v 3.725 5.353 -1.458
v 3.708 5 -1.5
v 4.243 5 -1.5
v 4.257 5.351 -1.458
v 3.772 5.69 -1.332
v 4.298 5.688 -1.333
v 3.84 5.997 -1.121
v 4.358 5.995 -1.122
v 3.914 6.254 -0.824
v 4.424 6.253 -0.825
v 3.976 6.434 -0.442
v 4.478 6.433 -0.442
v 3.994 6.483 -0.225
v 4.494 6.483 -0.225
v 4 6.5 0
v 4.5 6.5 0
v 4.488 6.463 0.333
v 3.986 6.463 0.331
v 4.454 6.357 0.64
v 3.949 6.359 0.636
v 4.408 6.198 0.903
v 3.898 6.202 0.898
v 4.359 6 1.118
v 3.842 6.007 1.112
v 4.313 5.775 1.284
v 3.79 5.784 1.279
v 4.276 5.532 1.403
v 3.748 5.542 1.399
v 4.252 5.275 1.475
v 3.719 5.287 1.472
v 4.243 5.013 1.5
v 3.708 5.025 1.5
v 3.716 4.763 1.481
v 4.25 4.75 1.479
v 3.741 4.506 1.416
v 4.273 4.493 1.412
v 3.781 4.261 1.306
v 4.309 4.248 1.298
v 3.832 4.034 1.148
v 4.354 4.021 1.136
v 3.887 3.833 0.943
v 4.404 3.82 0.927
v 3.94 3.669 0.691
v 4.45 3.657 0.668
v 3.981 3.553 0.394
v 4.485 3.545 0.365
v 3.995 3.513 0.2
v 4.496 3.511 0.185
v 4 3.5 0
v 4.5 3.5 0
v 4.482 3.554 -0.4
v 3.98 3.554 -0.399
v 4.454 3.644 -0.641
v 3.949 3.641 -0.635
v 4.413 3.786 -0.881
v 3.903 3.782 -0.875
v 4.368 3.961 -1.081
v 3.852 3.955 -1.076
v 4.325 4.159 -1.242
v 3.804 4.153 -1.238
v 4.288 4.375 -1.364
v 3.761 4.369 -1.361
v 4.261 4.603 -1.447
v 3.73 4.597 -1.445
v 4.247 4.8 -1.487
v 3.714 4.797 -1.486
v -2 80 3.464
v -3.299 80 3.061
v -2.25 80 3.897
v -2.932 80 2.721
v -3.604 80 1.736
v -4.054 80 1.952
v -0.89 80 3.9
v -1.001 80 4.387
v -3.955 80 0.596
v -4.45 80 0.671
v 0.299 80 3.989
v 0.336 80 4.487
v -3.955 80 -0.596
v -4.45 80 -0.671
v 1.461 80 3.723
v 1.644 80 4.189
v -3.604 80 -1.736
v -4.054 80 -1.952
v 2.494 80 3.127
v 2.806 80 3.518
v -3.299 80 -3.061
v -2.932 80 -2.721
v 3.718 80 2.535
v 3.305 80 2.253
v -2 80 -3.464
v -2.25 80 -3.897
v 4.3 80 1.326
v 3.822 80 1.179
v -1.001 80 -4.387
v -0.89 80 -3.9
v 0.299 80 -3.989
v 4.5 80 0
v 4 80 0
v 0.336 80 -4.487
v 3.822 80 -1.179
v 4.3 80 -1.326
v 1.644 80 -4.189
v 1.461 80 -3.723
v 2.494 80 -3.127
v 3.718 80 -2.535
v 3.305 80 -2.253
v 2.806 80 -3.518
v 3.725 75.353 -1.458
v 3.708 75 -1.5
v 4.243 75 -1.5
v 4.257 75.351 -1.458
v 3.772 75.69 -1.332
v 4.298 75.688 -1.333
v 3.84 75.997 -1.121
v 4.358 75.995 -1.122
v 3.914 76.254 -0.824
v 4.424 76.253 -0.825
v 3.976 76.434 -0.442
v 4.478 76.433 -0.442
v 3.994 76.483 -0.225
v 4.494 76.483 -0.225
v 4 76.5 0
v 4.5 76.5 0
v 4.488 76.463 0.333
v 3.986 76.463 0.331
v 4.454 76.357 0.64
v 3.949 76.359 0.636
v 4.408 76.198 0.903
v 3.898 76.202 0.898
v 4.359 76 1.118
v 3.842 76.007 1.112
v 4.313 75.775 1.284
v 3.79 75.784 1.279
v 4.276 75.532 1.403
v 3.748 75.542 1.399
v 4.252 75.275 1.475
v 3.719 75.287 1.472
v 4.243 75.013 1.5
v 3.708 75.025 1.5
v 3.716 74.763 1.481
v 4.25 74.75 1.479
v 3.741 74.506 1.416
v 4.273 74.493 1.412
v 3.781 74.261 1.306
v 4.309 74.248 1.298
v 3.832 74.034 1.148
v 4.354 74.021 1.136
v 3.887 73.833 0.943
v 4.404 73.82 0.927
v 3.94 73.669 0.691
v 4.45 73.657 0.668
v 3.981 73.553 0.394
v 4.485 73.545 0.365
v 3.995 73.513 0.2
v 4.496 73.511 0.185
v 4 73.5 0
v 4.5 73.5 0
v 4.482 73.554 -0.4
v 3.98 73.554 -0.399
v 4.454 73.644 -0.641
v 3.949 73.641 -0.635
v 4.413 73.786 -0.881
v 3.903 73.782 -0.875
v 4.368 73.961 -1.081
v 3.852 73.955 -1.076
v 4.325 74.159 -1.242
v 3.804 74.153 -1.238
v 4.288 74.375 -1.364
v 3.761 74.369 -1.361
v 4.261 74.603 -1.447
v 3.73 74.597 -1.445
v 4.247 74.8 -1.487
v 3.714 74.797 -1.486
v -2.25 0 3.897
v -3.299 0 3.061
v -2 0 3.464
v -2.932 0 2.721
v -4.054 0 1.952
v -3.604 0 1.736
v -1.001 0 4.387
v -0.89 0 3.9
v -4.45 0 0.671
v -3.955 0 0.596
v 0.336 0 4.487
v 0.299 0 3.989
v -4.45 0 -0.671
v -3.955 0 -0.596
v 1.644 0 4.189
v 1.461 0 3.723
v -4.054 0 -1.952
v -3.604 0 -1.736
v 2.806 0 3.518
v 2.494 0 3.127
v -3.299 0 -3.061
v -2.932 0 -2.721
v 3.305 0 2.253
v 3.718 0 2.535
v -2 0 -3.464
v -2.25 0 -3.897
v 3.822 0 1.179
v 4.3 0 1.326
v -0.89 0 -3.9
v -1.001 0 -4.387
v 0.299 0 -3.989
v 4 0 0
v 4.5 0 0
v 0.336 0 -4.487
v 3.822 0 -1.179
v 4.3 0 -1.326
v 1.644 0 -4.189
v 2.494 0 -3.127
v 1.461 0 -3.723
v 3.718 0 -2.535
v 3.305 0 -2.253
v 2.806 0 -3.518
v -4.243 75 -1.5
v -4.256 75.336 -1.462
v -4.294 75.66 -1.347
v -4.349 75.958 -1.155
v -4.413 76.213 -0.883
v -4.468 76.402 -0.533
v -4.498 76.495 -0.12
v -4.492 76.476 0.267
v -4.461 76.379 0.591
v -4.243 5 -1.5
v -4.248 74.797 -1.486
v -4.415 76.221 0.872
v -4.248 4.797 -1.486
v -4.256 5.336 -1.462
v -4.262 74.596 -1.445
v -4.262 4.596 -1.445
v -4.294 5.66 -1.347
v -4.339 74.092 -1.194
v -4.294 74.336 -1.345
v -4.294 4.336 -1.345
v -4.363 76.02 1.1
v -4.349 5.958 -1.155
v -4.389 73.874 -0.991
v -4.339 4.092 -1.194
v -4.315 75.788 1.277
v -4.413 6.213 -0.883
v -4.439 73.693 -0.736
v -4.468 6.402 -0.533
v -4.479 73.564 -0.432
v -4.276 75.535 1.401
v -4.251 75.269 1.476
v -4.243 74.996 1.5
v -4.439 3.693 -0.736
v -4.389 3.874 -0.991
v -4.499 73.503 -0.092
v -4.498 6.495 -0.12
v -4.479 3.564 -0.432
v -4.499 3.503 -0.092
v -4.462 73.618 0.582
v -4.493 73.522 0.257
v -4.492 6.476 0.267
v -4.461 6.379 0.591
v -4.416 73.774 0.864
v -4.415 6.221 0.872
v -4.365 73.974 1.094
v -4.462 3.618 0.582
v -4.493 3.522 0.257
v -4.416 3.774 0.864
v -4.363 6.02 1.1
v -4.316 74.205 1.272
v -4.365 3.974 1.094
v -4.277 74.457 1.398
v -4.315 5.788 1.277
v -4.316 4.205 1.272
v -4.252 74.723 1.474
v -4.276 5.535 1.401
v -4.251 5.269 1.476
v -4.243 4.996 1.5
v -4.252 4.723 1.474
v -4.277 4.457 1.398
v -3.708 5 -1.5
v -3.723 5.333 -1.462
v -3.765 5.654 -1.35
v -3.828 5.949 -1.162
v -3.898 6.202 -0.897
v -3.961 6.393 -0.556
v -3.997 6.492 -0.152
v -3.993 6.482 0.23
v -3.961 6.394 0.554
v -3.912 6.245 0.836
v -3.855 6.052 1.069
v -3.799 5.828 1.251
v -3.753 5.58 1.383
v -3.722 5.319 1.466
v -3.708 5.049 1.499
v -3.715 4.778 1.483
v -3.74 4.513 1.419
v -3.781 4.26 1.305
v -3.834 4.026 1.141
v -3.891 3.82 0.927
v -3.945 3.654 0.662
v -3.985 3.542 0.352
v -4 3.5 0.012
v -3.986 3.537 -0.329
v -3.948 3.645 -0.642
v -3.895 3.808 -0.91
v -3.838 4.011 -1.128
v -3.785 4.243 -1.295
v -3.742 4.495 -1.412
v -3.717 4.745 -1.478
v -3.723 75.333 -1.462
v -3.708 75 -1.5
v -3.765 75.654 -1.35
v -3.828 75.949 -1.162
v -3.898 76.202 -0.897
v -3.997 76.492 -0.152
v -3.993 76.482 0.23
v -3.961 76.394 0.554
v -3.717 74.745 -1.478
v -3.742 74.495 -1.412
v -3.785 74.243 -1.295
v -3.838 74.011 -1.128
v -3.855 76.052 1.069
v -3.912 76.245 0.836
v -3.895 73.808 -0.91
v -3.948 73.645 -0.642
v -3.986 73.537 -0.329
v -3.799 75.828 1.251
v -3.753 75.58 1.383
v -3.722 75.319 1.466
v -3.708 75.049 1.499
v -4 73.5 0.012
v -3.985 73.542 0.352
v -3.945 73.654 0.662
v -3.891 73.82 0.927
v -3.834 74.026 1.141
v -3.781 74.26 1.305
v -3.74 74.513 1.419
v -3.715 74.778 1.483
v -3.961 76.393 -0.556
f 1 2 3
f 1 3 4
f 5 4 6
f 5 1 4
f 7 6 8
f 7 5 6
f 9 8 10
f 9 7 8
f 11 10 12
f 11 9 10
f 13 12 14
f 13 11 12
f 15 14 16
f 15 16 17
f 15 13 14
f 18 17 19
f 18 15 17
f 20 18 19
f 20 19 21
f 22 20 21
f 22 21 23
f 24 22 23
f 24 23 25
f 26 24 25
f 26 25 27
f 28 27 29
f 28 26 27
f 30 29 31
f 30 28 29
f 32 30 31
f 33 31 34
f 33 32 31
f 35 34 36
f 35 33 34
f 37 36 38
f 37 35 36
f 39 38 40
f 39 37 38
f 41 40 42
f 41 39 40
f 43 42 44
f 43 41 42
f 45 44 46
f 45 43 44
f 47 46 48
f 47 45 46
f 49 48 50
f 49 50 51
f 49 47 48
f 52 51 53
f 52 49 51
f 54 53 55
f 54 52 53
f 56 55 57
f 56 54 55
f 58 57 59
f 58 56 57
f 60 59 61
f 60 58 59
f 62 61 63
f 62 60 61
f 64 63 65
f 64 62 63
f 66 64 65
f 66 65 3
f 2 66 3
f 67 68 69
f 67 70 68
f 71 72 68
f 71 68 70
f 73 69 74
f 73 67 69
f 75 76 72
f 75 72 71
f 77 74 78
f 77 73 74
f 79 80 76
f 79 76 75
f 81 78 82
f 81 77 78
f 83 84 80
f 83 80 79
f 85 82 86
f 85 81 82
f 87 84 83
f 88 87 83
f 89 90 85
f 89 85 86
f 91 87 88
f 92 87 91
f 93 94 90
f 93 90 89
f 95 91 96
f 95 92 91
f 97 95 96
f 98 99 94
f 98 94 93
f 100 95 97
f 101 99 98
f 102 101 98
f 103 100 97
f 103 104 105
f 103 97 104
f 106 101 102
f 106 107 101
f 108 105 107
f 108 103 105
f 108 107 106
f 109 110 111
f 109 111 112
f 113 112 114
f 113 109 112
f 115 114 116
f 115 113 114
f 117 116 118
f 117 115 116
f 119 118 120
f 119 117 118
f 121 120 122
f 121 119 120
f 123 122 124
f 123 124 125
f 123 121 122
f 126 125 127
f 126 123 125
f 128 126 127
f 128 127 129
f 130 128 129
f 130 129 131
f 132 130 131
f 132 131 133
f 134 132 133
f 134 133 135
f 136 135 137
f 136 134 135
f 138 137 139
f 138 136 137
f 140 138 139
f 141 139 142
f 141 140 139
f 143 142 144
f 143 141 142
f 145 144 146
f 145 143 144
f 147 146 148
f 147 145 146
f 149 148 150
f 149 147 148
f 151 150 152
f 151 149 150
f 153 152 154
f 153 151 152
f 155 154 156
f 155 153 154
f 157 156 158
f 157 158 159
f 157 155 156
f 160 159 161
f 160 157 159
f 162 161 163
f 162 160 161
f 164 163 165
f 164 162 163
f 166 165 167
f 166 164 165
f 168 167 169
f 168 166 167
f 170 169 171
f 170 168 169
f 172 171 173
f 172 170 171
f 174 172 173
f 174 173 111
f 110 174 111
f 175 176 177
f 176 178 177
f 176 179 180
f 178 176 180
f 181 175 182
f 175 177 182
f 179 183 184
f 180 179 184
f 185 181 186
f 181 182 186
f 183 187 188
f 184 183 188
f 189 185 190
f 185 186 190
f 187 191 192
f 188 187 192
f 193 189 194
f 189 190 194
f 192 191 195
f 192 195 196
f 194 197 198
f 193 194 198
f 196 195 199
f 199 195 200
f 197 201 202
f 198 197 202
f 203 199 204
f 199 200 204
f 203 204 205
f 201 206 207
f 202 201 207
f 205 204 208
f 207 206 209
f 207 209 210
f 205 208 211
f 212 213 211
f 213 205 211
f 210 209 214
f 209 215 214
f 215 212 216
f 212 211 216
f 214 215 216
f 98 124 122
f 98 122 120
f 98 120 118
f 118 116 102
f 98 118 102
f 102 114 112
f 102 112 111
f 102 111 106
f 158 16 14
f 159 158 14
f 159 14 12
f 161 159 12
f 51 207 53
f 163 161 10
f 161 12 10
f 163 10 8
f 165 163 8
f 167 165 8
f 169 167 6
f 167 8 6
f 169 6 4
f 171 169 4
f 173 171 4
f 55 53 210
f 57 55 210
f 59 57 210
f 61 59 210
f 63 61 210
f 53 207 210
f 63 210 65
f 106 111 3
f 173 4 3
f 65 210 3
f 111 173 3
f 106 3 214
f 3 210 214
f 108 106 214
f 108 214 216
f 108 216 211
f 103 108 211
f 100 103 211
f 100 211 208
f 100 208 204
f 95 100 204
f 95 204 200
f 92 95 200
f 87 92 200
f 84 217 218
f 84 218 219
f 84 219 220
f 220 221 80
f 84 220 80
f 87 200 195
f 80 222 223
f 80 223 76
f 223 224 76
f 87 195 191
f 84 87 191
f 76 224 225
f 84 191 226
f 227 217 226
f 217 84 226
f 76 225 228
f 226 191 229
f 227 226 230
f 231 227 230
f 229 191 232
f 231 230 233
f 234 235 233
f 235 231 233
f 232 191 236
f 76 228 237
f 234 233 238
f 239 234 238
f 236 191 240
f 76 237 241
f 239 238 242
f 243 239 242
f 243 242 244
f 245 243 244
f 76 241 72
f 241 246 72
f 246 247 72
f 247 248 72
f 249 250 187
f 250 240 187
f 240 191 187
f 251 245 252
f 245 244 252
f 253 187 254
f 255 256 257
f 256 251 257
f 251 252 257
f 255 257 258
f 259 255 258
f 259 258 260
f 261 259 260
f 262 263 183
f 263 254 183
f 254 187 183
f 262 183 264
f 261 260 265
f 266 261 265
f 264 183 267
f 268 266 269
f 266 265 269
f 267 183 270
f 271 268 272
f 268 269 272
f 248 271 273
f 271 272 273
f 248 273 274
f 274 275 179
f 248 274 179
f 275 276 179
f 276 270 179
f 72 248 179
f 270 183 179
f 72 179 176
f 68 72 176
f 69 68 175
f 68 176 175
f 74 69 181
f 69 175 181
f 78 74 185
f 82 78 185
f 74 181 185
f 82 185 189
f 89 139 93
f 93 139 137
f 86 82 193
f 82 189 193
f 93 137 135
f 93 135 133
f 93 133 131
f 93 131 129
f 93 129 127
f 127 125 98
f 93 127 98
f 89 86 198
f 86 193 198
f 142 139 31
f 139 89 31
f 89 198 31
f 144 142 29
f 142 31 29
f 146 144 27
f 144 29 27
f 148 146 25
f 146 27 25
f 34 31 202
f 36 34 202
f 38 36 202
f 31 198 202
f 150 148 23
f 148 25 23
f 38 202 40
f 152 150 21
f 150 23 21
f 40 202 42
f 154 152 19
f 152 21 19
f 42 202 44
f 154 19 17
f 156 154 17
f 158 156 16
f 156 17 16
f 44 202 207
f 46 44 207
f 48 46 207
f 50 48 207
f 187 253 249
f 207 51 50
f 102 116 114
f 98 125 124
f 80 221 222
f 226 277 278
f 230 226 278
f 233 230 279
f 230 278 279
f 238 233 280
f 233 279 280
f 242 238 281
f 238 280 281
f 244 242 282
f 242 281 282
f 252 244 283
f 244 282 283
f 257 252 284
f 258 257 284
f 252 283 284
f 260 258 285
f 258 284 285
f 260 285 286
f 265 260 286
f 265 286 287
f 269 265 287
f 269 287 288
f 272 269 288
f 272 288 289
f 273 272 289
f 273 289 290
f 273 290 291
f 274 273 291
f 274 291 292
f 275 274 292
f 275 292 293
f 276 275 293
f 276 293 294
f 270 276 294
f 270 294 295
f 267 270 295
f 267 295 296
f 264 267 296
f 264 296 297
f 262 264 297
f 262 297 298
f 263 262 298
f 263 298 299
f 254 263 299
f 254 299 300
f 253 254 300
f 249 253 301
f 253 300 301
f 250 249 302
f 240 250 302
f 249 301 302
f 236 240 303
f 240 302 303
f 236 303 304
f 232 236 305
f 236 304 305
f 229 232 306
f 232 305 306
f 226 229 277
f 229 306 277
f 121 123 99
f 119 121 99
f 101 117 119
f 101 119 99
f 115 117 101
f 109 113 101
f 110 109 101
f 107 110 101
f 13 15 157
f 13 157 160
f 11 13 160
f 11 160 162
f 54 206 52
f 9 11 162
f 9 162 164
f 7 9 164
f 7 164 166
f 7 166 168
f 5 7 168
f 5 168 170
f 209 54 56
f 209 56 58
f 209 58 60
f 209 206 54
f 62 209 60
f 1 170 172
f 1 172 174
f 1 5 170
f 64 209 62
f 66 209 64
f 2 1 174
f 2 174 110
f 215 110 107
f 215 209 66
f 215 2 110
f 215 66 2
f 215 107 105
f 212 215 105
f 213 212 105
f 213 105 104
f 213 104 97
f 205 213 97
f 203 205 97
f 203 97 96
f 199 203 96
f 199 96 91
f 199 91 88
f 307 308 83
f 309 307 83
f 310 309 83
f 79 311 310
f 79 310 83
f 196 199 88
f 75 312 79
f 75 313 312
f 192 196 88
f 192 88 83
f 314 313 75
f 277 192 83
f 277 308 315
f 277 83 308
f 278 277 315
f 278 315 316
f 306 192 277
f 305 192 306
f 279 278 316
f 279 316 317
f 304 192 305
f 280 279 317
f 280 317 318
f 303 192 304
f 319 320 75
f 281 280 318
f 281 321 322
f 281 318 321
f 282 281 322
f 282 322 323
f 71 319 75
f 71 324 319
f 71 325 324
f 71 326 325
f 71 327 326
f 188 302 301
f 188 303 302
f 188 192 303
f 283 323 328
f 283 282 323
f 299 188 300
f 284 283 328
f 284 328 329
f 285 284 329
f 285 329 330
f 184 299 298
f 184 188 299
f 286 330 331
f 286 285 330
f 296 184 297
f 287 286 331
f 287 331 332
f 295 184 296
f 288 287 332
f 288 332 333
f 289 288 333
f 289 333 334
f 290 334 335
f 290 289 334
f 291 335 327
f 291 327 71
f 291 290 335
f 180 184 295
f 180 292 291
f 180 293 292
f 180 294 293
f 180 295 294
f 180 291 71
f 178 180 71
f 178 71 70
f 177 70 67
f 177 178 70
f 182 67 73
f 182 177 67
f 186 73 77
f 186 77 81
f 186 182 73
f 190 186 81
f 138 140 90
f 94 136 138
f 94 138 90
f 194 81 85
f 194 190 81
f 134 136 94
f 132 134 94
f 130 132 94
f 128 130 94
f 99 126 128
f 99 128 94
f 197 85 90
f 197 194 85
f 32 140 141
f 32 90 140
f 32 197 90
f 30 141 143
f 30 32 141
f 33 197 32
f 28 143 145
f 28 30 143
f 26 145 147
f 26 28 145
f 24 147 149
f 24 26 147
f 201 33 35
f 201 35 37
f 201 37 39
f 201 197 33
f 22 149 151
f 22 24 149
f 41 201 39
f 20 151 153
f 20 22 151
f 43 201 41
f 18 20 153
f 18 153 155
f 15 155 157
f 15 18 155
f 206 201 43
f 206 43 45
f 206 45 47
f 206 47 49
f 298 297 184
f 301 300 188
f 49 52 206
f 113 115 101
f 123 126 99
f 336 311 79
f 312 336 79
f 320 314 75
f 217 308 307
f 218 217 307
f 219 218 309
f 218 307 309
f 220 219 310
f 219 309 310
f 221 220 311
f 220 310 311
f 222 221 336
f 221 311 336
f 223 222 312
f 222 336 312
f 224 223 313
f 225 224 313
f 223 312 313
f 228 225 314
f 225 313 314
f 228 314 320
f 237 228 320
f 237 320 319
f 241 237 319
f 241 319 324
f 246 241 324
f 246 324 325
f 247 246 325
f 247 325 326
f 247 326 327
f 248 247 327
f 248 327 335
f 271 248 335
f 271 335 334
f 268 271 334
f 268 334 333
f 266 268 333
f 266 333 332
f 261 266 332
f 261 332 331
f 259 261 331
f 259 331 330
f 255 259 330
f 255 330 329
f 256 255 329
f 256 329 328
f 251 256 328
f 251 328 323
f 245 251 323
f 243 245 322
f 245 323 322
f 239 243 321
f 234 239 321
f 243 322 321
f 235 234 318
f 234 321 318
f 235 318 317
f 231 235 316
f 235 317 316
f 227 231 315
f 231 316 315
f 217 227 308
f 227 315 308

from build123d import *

# Parameters (mm, degrees)
CROQUIS1_R                 = 4.5
CROQUIS1_R_2               = 4
SALIENTE_EXTRUIR1_DEPTH    = 80
CROQUIS2_R                 = 1.5
CORTAR_EXTRUIR1_DEPTH      = 5.5
CORTAR_EXTRUIR1_DEPTH_BACK = 5.5


with BuildPart() as part:
    # Croquis1 → Saliente-Extruir1 (new body)
    with BuildSketch(Plane(origin=(0, 0, 0), x_dir=(1, 0, 0), z_dir=(0, 1, 0))):
        Circle(CROQUIS1_R)
        Circle(CROQUIS1_R_2, mode=Mode.SUBTRACT)
    extrude(amount=SALIENTE_EXTRUIR1_DEPTH)

    # Croquis2 → Cortar-Extruir1 (cut, two sides)
    with BuildSketch(Plane(origin=(0, 0, 0), x_dir=(0, 0, -1), z_dir=(1, 0, 0))) as cortar_extruir1_sk:
        with Locations((0, 75)):
            Circle(CROQUIS2_R)
        with Locations((0, 5)):
            Circle(CROQUIS2_R)
    extrude(amount=CORTAR_EXTRUIR1_DEPTH, mode=Mode.SUBTRACT)
    extrude(cortar_extruir1_sk.sketch, amount=-CORTAR_EXTRUIR1_DEPTH_BACK, mode=Mode.SUBTRACT)


solid = part.part
